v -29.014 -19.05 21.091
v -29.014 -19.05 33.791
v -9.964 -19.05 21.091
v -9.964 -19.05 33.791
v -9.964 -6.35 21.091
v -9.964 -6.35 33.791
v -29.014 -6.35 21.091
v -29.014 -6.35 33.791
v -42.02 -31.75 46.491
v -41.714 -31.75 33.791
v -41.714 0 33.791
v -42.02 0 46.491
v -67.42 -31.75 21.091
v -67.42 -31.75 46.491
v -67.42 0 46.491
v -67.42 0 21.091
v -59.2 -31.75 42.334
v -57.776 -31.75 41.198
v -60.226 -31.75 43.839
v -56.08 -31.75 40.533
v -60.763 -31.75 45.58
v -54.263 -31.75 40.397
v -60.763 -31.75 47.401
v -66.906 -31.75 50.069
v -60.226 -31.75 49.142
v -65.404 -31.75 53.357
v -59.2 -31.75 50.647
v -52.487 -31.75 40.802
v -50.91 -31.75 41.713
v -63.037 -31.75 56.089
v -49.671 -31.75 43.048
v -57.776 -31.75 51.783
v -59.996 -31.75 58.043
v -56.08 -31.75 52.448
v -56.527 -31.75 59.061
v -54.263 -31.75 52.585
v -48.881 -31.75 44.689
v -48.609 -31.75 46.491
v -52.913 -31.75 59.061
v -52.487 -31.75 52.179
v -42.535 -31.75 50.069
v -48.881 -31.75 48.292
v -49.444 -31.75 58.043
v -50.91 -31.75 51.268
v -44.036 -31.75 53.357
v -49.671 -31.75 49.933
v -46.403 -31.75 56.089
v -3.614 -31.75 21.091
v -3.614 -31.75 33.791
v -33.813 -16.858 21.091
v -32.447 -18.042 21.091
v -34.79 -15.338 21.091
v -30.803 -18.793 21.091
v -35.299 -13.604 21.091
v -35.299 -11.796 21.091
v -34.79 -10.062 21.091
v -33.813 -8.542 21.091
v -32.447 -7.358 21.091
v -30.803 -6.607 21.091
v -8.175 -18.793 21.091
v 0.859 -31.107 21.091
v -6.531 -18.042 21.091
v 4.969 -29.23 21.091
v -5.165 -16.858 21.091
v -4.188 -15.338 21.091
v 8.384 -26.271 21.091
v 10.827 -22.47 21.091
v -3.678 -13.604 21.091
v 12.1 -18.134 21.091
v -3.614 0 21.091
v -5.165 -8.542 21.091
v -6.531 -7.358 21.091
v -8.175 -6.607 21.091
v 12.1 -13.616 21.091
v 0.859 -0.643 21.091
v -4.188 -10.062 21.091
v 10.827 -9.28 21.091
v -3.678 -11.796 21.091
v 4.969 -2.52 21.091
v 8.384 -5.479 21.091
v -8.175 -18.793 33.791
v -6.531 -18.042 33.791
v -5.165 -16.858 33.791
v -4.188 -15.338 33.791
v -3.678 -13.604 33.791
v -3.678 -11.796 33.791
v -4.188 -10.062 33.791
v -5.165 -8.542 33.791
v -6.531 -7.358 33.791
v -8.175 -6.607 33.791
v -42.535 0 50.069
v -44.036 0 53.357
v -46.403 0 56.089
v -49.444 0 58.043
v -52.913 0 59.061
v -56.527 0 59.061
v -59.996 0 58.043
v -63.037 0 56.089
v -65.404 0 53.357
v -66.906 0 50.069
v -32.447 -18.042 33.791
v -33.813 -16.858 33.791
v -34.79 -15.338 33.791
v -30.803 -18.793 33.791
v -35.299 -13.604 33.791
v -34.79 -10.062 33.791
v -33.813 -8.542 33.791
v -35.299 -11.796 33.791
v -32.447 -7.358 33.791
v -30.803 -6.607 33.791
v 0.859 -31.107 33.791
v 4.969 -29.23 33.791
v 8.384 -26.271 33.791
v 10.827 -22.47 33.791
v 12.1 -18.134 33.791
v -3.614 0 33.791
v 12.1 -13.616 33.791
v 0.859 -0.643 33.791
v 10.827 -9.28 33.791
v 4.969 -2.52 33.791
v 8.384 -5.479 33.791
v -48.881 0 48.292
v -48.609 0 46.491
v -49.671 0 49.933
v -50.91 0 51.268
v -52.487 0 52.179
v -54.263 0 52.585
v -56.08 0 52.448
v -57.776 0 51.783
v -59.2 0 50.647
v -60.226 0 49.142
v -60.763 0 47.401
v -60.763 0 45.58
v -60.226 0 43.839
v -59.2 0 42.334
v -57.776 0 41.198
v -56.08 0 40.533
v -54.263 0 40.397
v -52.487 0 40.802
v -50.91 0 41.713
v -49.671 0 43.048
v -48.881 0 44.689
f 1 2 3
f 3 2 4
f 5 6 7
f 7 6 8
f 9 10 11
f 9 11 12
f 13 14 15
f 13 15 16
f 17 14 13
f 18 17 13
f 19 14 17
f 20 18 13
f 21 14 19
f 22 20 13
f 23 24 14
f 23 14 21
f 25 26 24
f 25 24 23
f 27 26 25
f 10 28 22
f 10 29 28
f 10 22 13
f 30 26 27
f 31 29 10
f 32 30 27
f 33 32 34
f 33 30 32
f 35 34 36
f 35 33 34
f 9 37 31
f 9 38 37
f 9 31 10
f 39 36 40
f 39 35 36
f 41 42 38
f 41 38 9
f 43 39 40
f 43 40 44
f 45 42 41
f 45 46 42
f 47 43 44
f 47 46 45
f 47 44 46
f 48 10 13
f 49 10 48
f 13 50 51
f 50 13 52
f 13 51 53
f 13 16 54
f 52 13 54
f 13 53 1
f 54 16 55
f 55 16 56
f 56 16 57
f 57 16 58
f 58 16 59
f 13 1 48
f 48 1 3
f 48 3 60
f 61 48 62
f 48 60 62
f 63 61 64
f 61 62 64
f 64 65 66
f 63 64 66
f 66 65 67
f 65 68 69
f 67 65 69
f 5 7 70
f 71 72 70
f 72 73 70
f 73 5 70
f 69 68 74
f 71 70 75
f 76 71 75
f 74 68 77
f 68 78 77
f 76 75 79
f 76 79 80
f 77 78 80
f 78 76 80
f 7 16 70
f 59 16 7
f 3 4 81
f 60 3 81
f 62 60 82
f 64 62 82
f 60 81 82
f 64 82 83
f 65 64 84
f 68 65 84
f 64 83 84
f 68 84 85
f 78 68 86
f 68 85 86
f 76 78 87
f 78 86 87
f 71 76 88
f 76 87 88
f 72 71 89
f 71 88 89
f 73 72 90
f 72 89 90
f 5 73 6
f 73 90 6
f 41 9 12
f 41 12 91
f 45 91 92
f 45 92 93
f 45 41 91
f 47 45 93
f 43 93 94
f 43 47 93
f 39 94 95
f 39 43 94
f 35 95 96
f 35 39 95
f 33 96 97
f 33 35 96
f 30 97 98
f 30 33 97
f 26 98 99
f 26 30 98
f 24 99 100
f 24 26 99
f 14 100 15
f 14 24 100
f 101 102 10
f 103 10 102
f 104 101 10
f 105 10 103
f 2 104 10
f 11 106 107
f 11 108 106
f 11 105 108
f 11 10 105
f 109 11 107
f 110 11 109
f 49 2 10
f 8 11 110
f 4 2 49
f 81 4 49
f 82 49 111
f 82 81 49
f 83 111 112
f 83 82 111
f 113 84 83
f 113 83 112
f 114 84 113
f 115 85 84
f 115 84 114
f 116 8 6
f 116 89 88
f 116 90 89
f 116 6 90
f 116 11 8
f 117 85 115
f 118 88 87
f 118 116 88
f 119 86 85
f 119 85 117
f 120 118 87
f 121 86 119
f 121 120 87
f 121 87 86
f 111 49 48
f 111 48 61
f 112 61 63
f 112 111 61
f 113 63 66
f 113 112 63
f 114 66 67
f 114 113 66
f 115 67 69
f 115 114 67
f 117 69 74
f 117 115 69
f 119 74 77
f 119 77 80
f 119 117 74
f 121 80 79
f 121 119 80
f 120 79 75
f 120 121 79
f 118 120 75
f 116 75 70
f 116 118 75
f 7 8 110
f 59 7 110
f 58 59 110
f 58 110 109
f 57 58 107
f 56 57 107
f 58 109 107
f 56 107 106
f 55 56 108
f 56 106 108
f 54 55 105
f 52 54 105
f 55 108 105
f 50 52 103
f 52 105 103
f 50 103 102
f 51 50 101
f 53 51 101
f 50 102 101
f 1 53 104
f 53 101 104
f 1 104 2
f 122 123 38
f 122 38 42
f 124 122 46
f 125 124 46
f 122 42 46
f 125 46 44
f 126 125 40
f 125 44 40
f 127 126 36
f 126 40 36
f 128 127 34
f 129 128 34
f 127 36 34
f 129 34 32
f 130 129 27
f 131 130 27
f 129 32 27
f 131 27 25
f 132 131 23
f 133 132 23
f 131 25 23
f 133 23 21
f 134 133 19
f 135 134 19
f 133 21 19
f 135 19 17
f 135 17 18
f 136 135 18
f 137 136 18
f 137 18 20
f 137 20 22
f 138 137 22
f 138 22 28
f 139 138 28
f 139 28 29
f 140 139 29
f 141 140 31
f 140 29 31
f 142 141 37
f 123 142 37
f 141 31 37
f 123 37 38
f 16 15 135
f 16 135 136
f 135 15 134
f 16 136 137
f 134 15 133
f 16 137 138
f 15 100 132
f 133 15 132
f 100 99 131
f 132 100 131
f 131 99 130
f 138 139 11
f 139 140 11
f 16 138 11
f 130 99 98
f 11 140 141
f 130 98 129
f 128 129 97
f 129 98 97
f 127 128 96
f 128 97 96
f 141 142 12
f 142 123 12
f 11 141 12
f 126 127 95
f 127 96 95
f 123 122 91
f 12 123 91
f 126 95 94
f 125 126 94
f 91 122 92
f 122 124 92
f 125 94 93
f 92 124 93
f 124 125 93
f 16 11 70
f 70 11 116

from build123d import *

# Parameters (mm, degrees)
F1_DEPTH = 31.75
F3_DEPTH = 31.75
F4_R     = 6.111063
F5_DEPTH = 31.75
F7_DEPTH = 12.7
F9_DEPTH = 25.4


with BuildPart() as f1:
    # F0 (on Front) → F1 (new body)
    with BuildSketch(Plane.XZ):
        Polygon((-42.020088, 46.490617), (-67.420088, 46.490617), (-67.420088, 21.090617), (-3.613756, 21.090617), (-3.613756, 33.790617), (-41.713756, 33.790617), align=None)
    extrude(amount=F1_DEPTH)

    # F2 (on face) → F3 (join)
    with BuildSketch(Plane.XZ.offset(31.75)):
        with BuildLine():
            Line((-67.420088, 46.490617), (-42.020088, 46.490617))
            ThreePointArc((-42.020088, 46.490617), (-54.720088, 59.190617), (-67.420088, 46.490617))
        make_face()
    extrude(amount=-F3_DEPTH)

    # F4 (on face) → F5 (cut)
    with BuildSketch(Plane.XZ.offset(31.75)):
        with Locations((-54.720088, 46.490617)):
            Circle(F4_R)
    extrude(amount=-F5_DEPTH, mode=Mode.SUBTRACT)

    # F6 (on face) → F7 (join)
    with BuildSketch(Plane.XY.offset(33.790617)):
        with BuildLine():
            Line((-3.613756, 0), (-3.613756, -31.75))
            ThreePointArc((-3.613756, -31.75), (12.261244, -15.875), (-3.613756, 0))
        make_face()
    extrude(amount=-F7_DEPTH)

    # F8 (on face) → F9 (cut)
    with BuildSketch(Plane.XY.offset(33.790617)):
        with BuildLine():
            Line((-9.963756, -6.35), (-29.013756, -6.35))
            ThreePointArc((-29.013756, -6.35), (-35.363756, -12.7), (-29.013756, -19.05))
            Line((-29.013756, -19.05), (-9.963756, -19.05))
            ThreePointArc((-9.963756, -19.05), (-3.613756, -12.7), (-9.963756, -6.35))
        make_face()
    extrude(amount=-F9_DEPTH, mode=Mode.SUBTRACT)


solid = f1.part
